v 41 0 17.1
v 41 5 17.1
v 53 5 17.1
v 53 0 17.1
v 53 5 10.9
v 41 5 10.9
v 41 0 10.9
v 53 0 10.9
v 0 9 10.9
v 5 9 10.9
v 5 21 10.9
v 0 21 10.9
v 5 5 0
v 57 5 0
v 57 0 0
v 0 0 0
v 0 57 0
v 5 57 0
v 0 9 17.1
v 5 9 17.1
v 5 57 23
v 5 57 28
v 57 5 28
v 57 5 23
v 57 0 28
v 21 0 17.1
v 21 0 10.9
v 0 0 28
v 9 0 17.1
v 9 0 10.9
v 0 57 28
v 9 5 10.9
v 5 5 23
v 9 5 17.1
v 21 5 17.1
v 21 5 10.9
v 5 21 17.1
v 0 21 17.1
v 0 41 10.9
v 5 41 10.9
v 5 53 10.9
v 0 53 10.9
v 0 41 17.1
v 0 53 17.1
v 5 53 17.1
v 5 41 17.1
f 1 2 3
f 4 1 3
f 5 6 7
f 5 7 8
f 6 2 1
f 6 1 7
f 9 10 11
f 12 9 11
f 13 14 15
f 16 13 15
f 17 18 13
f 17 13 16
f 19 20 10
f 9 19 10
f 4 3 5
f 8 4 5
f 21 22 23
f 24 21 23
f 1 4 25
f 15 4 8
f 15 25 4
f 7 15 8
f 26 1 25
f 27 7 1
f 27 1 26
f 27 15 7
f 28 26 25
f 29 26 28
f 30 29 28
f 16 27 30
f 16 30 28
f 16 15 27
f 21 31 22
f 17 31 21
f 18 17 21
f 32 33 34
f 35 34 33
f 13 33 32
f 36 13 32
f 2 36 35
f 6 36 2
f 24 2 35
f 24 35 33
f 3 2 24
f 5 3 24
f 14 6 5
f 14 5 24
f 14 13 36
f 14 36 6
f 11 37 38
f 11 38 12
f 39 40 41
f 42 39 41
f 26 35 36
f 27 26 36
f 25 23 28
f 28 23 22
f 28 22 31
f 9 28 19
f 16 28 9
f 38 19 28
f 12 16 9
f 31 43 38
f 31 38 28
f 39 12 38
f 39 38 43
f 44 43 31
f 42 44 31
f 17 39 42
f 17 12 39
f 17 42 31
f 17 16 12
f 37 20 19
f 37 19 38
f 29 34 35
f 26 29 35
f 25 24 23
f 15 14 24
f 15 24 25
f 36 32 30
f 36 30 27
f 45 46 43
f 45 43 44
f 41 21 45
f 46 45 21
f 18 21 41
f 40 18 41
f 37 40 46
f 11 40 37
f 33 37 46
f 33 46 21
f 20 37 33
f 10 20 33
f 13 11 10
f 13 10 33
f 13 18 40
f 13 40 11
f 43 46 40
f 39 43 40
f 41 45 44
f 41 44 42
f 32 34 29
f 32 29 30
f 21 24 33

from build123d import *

# Parameters (mm, degrees)
BOSS_EXTRUDE1_DEPTH = 28
BOSS_EXTRUDE2_DEPTH = 5
SKETCH3_W           = 6.2
SKETCH3_H           = 12
CUT_EXTRUDE1_DEPTH  = 5
SKETCH4_W           = 12
SKETCH4_H           = 6.2
CUT_EXTRUDE2_DEPTH  = 5


with BuildPart() as part:
    # Sketch1 → Boss-Extrude1 (new body)
    with BuildSketch(Plane.XY):
        Polygon((5, 57), (5, 5), (57, 5), (57, 0), (0, 0), (0, 57), align=None)
    extrude(amount=BOSS_EXTRUDE1_DEPTH)

    # Sketch2 → Boss-Extrude2 (add)
    with BuildSketch(Plane.XY.offset(28)):
        Polygon((5, 57), (57, 5), (5, 5), align=None)
    extrude(amount=-BOSS_EXTRUDE2_DEPTH)

    # Sketch3 → Cut-Extrude1 (cut)
    with BuildSketch(Plane(origin=(5, 0, 0), x_dir=(0, 0, -1), z_dir=(1, 0, 0))):
        with Locations((-14, 47)):
            Rectangle(SKETCH3_W, SKETCH3_H)
        with Locations((-14, 15)):
            Rectangle(SKETCH3_W, SKETCH3_H)
    extrude(amount=-CUT_EXTRUDE1_DEPTH, mode=Mode.SUBTRACT)

    # Sketch4 → Cut-Extrude2 (cut)
    with BuildSketch(Plane(origin=(0, 5, 0), x_dir=(1, 0, 0), z_dir=(0, 1, 0))):
        with Locations((47, -14)):
            Rectangle(SKETCH4_W, SKETCH4_H)
        with Locations((15, -14)):
            Rectangle(SKETCH4_W, SKETCH4_H)
    extrude(amount=-CUT_EXTRUDE2_DEPTH, mode=Mode.SUBTRACT)


solid = part.part
